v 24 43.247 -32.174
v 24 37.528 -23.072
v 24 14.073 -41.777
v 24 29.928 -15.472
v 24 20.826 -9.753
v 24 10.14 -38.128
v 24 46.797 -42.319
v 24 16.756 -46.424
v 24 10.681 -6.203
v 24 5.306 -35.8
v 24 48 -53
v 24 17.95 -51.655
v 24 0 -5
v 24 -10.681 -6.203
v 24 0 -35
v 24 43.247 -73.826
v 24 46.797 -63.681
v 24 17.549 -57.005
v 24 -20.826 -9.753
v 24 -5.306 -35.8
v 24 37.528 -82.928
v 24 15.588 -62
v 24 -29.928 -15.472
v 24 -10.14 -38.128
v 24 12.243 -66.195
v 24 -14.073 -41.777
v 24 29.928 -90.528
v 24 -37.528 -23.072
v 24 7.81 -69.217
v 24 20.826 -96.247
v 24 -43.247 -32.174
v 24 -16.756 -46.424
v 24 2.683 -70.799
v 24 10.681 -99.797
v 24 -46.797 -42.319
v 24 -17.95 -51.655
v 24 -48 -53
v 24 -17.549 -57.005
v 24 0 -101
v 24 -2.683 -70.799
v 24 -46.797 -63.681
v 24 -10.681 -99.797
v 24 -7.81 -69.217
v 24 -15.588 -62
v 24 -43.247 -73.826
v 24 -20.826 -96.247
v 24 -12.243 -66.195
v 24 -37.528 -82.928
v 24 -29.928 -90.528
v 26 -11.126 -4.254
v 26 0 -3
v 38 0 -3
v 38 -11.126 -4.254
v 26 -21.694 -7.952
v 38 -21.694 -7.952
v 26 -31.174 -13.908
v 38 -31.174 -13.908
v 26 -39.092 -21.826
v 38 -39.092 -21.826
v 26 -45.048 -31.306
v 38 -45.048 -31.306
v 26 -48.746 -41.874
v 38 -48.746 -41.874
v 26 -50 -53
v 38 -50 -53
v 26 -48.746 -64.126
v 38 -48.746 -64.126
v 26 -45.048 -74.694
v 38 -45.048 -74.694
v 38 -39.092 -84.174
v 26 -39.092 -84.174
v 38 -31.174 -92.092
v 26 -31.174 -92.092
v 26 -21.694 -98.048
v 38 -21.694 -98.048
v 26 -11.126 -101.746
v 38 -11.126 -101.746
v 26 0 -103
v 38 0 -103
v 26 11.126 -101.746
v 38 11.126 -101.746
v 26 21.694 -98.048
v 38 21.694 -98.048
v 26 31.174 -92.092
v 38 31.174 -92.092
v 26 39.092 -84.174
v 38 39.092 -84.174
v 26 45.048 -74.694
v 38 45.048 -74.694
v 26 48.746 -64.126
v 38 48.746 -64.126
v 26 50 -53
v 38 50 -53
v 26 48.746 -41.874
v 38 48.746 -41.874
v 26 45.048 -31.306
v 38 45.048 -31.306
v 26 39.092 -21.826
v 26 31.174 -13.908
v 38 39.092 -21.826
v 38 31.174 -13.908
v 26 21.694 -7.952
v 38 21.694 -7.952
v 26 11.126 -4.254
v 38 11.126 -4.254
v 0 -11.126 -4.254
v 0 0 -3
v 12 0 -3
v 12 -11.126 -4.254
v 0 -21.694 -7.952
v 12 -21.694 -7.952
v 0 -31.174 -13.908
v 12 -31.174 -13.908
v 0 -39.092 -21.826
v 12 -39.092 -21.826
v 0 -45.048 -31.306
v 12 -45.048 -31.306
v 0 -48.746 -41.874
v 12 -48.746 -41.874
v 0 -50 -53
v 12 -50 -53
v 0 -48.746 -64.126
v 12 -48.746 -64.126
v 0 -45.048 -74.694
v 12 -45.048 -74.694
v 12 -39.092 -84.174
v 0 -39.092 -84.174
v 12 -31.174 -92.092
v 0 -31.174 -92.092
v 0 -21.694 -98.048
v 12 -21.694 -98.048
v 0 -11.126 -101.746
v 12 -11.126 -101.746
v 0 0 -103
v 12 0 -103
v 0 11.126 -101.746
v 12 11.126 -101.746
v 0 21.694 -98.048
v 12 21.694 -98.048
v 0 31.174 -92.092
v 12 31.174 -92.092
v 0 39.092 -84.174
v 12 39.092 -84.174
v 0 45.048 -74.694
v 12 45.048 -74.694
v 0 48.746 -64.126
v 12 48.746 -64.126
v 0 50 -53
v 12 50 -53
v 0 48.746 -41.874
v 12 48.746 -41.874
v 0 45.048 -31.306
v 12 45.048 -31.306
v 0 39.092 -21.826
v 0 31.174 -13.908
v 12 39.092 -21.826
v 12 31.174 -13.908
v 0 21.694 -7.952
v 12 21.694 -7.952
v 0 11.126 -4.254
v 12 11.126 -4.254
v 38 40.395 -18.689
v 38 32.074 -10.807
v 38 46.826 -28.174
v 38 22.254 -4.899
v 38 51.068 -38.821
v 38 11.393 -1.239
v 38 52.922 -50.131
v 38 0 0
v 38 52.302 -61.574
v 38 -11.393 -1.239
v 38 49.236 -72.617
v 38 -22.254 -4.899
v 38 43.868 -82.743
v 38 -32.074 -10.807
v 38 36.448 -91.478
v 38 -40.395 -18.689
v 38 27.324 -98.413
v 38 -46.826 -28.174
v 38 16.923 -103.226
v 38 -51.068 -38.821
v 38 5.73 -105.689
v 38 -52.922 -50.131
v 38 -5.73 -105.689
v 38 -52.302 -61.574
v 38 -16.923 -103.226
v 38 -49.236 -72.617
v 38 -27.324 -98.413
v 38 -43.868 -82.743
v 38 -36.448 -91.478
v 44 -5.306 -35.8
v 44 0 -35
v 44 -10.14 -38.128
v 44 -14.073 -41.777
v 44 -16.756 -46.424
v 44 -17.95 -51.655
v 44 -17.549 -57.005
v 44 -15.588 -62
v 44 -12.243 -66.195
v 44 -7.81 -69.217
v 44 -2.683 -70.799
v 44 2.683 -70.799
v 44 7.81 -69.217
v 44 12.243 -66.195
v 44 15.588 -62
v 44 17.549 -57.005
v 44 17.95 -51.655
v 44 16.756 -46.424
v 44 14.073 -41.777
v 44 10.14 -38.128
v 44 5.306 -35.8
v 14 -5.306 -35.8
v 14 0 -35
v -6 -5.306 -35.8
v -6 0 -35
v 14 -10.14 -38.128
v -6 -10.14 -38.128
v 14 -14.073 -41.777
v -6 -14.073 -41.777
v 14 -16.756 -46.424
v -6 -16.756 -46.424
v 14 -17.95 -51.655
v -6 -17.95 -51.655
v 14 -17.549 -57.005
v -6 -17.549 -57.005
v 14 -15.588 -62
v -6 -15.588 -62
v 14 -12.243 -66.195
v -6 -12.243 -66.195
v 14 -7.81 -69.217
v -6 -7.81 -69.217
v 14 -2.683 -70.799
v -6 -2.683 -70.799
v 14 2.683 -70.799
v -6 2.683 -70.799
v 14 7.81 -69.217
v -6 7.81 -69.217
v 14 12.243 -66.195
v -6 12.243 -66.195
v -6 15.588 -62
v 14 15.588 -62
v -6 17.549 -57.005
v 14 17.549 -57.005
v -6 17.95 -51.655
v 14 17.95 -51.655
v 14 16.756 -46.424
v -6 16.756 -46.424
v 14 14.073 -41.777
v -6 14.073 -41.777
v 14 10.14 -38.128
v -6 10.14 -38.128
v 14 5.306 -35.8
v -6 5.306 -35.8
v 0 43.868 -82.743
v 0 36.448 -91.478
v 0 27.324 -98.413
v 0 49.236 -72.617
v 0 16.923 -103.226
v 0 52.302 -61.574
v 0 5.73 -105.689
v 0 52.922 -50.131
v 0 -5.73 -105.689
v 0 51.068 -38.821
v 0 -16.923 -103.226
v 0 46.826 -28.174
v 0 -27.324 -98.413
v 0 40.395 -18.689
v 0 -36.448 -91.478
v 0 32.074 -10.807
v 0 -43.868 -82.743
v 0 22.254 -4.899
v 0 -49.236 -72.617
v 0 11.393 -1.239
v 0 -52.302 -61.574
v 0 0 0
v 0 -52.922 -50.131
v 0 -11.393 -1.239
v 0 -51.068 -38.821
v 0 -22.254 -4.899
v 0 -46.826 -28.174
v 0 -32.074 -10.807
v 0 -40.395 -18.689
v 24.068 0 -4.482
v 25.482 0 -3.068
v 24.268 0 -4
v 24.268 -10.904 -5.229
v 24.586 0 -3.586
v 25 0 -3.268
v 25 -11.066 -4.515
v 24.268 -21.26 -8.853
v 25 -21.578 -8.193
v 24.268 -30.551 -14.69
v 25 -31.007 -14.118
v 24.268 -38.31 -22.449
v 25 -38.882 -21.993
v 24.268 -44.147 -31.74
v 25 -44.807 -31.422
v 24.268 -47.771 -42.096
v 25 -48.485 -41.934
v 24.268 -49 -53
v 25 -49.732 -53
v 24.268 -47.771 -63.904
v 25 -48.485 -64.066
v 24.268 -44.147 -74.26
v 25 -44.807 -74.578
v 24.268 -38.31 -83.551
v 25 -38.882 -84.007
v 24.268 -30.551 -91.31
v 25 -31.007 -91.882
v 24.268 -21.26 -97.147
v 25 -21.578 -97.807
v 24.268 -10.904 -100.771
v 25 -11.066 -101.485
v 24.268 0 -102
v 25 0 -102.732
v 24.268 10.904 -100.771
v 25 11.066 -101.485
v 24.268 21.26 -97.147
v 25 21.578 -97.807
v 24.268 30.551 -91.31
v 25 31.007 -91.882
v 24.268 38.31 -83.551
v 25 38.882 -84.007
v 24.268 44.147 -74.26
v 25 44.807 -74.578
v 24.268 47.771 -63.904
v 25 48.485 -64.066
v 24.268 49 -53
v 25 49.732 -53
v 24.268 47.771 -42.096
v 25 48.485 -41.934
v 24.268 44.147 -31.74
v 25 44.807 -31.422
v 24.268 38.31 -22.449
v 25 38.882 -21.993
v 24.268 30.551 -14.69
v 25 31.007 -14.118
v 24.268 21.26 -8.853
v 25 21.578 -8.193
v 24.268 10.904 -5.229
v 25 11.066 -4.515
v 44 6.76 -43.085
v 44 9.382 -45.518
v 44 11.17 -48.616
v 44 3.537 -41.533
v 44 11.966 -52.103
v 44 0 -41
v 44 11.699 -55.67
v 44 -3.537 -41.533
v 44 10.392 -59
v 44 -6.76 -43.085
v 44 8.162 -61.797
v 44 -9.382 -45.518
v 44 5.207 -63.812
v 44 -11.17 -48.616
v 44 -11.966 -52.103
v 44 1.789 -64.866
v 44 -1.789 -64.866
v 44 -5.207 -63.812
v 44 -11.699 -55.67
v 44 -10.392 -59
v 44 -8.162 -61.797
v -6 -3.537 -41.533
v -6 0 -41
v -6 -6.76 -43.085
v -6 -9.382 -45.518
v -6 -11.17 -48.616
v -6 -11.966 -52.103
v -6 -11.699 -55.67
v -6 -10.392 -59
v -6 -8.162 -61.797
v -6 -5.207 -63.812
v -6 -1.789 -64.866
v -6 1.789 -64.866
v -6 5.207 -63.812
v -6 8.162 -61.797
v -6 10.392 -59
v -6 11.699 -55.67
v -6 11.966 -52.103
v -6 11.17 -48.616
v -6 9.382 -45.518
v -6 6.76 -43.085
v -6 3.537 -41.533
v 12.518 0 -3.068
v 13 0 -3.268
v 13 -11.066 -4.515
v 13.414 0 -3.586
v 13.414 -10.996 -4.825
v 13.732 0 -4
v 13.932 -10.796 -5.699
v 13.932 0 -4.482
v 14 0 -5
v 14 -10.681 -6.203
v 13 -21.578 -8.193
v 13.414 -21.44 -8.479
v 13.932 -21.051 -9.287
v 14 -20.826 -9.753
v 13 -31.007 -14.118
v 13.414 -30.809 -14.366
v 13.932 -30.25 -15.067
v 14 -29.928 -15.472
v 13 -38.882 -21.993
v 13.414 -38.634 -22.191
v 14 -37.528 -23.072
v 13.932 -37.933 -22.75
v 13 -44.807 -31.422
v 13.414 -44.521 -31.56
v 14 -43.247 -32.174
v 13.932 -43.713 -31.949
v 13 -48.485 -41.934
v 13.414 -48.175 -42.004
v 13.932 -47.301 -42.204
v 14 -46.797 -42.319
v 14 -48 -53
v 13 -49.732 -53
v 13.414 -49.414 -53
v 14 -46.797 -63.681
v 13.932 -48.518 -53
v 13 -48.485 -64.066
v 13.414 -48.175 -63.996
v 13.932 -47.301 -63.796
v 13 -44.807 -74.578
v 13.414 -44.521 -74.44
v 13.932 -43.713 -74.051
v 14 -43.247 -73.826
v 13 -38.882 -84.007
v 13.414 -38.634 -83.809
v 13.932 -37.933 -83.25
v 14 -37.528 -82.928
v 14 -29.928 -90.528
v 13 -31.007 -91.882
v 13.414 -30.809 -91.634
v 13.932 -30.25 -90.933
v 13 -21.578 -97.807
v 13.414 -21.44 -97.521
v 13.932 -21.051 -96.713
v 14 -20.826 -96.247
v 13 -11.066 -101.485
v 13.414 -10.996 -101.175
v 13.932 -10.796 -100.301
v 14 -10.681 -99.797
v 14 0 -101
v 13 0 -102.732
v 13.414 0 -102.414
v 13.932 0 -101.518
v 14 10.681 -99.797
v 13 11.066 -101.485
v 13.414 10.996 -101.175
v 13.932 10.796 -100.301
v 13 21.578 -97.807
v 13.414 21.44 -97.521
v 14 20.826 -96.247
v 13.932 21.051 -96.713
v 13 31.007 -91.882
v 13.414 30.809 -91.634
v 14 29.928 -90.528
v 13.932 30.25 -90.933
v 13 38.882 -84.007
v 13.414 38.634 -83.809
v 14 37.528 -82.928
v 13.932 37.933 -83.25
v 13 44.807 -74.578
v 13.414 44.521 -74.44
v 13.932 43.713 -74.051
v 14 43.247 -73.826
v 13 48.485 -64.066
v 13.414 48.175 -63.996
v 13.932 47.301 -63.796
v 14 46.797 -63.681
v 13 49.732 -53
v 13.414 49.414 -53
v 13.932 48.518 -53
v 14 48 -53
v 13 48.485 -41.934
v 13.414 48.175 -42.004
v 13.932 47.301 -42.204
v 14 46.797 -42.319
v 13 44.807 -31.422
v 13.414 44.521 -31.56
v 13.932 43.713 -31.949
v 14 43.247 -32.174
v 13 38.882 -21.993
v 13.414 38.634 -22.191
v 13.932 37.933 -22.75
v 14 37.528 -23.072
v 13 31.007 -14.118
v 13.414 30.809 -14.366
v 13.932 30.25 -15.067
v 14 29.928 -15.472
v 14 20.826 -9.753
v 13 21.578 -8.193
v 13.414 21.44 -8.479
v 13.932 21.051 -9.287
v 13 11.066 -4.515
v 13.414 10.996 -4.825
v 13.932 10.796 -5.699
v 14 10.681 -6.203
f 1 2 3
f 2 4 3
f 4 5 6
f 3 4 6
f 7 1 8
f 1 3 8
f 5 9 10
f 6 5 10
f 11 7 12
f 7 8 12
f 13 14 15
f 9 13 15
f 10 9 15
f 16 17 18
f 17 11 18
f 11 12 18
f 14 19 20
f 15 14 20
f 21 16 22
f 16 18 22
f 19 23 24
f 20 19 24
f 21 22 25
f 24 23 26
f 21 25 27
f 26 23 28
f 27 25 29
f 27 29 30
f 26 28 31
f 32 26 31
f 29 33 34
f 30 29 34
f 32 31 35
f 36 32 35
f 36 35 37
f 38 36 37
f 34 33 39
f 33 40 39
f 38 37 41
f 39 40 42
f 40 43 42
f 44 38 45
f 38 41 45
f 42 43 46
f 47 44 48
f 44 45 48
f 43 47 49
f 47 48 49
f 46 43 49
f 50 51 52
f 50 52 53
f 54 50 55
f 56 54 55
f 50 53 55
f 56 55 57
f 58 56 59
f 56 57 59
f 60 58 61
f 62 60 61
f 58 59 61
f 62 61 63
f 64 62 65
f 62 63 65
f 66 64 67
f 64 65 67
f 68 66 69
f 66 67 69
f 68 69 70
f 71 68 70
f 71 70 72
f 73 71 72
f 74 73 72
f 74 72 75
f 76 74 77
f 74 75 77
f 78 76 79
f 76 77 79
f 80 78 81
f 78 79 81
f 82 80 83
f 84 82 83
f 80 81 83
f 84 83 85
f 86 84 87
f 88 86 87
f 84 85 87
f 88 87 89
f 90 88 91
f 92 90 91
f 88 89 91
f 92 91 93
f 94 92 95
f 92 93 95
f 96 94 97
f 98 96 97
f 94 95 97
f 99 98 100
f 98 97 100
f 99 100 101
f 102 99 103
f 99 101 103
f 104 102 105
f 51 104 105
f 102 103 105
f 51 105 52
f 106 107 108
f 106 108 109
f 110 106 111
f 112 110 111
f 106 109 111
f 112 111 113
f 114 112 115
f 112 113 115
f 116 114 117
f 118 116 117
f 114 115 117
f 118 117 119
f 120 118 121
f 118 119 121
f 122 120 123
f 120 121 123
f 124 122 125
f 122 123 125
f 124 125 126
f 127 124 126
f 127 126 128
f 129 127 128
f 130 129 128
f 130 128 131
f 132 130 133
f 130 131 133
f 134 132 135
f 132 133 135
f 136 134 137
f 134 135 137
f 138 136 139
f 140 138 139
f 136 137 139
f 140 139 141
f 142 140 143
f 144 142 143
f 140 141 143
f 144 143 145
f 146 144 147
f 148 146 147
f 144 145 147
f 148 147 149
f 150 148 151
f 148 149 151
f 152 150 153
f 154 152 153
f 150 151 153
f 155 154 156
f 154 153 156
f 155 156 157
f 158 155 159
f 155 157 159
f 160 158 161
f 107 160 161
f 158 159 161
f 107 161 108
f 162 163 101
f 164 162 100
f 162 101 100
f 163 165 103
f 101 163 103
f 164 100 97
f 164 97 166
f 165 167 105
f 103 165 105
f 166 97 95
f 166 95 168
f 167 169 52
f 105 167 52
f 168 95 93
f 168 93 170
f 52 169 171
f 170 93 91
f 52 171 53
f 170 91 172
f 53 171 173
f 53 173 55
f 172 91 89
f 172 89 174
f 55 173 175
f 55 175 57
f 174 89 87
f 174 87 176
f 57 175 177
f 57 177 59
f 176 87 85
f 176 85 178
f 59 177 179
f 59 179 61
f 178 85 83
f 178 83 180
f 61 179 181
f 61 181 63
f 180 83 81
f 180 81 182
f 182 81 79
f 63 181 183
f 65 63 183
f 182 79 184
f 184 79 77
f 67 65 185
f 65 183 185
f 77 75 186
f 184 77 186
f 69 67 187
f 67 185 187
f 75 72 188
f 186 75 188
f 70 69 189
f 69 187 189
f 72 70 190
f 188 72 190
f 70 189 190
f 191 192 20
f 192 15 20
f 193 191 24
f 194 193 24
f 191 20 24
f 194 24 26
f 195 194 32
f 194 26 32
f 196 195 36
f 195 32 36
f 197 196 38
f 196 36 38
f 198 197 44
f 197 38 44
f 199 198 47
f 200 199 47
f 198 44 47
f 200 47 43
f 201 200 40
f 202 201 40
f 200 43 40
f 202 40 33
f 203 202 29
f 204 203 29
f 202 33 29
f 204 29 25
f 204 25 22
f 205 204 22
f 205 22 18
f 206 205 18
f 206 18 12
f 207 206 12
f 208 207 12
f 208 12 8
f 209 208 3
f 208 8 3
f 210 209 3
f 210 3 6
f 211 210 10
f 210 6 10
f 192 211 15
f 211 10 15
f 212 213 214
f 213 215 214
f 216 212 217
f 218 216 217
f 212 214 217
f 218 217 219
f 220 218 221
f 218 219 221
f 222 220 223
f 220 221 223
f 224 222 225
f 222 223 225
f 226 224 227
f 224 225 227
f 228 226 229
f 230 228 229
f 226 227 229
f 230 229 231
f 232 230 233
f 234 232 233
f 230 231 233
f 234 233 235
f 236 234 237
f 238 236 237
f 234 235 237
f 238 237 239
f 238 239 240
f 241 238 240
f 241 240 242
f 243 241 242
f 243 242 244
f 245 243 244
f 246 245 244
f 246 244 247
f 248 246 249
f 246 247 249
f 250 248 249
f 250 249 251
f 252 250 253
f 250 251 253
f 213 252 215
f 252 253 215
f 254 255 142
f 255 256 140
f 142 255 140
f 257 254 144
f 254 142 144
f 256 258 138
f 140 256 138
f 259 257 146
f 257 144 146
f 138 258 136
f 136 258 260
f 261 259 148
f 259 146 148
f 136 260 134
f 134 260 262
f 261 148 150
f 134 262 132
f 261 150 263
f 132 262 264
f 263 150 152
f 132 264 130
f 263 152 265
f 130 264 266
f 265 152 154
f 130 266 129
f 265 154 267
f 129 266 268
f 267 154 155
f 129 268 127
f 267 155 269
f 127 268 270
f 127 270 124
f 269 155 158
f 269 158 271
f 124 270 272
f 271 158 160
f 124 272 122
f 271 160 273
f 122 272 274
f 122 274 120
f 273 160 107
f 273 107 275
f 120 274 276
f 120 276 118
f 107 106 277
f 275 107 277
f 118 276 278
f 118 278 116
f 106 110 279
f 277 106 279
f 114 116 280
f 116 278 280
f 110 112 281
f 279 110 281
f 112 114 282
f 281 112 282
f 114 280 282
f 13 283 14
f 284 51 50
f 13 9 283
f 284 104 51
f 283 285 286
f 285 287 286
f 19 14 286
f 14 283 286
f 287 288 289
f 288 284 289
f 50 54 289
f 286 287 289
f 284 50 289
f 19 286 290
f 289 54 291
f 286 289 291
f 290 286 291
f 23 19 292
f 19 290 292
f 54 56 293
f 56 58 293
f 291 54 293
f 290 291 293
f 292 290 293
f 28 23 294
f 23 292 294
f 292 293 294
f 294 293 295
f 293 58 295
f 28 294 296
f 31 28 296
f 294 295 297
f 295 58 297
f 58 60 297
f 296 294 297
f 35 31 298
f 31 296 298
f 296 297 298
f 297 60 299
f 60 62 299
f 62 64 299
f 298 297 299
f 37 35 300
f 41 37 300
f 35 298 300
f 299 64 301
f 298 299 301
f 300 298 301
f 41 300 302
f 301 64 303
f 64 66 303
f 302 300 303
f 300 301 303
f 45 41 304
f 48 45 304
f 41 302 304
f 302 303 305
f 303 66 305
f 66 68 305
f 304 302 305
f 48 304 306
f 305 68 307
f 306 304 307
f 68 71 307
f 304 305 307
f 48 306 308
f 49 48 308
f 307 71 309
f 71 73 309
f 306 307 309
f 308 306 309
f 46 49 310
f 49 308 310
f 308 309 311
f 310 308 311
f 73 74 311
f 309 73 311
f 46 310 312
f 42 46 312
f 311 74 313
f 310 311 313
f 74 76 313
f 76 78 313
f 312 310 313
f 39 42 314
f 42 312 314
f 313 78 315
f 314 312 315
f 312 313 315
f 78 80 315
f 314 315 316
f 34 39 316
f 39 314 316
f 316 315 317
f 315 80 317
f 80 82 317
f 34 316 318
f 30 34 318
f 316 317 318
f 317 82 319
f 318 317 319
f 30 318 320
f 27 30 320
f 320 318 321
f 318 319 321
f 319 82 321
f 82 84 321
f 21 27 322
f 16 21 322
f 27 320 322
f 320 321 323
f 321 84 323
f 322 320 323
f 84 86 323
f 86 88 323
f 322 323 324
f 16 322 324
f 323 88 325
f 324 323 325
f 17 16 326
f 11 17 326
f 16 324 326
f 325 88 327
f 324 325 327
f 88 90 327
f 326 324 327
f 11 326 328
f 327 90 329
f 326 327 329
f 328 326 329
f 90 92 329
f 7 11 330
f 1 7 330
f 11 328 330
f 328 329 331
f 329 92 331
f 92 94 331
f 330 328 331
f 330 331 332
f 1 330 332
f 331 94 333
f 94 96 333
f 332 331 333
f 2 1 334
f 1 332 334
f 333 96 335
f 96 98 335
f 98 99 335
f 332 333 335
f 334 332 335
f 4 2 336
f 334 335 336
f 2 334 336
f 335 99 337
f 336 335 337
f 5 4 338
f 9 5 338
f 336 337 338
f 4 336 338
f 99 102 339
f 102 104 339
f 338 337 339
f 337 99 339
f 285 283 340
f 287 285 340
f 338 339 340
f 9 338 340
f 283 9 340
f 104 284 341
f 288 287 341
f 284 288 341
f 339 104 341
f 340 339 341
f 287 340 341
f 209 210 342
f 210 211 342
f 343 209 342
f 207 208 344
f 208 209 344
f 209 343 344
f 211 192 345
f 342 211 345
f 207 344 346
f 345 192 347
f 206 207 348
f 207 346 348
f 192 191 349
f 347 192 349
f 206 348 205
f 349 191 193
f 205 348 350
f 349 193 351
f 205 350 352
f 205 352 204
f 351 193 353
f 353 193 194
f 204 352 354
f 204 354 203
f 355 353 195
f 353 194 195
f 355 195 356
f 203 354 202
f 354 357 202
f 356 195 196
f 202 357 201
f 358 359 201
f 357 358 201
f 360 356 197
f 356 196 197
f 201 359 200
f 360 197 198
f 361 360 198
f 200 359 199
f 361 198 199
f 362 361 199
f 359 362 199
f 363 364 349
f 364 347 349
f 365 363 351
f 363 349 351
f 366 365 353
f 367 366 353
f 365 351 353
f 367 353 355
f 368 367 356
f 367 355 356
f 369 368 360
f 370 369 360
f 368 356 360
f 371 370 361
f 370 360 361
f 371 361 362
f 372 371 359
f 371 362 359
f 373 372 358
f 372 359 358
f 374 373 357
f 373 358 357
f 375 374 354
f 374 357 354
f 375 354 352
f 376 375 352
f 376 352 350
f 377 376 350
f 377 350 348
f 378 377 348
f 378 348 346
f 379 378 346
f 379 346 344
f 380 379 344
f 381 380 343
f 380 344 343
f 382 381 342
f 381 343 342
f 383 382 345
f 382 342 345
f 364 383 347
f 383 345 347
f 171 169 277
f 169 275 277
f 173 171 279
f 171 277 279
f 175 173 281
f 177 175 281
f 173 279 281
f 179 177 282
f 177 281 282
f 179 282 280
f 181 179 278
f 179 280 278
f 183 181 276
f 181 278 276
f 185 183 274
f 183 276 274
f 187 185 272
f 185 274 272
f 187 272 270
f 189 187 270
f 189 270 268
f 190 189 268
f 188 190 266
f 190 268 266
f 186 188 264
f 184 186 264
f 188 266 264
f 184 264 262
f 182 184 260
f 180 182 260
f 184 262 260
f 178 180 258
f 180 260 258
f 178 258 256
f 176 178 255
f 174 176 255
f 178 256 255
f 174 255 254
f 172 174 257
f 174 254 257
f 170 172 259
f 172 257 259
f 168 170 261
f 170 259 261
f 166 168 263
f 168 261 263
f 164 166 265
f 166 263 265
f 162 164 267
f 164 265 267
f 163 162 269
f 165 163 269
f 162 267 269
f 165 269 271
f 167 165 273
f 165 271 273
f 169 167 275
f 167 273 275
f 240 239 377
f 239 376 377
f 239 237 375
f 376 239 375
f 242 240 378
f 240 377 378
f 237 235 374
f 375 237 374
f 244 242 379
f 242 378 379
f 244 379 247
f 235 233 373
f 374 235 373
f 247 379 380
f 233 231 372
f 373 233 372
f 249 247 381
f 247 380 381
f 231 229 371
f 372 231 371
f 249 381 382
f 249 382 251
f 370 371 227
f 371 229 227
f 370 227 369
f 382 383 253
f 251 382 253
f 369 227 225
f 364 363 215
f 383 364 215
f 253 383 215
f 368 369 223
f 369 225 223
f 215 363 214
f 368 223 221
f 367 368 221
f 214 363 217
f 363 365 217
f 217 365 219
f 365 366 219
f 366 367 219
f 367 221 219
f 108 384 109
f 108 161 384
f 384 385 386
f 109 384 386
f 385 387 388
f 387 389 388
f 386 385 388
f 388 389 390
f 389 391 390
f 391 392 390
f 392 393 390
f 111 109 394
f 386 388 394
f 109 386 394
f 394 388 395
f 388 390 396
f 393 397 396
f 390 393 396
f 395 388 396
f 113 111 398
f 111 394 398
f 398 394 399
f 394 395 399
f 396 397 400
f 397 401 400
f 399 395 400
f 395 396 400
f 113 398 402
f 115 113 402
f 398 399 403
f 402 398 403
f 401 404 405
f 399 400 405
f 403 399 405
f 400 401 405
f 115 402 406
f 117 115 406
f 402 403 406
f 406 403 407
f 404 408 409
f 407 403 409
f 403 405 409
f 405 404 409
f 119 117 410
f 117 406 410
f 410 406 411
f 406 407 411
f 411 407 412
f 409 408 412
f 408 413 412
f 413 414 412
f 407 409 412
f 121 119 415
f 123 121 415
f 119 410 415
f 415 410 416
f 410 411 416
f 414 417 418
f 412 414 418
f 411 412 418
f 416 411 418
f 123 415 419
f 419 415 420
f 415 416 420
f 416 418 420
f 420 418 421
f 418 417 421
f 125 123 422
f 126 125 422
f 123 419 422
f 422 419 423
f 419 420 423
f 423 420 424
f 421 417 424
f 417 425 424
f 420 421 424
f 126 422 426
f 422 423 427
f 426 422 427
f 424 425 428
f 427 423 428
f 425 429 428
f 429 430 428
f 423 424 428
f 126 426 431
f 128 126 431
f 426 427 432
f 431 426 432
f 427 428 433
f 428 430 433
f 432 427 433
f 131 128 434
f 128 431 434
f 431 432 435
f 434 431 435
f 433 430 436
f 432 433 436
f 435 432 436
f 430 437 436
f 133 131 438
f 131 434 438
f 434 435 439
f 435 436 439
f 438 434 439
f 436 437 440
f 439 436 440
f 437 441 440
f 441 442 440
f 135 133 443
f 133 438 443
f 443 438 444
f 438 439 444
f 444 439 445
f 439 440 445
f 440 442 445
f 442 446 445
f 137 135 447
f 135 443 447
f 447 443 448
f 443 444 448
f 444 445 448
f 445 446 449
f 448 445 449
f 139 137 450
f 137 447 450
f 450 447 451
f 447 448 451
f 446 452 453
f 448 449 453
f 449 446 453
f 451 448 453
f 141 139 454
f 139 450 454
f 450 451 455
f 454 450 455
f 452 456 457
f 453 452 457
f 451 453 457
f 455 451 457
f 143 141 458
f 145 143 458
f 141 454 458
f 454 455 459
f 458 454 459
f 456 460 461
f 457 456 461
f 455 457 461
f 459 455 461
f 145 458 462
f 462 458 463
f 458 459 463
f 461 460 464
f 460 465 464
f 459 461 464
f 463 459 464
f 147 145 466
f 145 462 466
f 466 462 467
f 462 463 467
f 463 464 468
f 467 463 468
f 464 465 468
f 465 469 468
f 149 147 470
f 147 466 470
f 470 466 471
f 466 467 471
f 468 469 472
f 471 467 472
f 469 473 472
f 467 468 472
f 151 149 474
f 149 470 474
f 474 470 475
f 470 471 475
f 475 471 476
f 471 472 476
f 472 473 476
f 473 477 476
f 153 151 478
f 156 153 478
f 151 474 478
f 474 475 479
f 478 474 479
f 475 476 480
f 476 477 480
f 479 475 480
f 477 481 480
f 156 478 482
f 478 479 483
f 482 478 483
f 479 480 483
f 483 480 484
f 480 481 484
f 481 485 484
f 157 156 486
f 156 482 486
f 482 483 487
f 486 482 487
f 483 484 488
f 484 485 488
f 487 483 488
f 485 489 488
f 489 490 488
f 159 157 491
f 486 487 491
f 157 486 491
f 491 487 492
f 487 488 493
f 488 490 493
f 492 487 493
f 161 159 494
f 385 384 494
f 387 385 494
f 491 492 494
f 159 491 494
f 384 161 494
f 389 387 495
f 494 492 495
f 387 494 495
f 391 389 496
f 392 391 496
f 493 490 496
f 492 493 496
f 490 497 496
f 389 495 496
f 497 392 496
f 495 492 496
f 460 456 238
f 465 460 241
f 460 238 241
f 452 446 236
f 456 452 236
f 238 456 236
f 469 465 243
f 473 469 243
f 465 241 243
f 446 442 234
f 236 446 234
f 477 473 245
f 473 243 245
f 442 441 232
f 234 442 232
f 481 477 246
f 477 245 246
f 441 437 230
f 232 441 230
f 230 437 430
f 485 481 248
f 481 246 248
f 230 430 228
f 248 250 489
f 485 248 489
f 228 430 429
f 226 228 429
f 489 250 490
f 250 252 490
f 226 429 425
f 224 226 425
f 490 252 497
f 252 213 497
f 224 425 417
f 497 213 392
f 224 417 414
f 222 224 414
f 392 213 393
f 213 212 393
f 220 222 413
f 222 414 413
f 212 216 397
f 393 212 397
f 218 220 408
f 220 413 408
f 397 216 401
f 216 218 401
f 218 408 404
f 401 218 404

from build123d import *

# Parameters (mm, degrees)
F2_R = 2


with BuildPart() as f1:
    # F0 (on Front) → F1 (revolve)
    with BuildSketch(Plane.XZ):
        Polygon((38, 0), (0, 0), (0, -3), (12.181578204, -3), (14, -3), (14, -35), (-6, -35), (-6, -41), (44, -41), (44, -35), (24, -35), (24, -3), (38, -3), align=None)
    revolve(axis=Axis((16.9901512563, 0, -53), (1, 0, 0)))

    # F2
    f2_edges = [f1.edges().sort_by_distance(p)[0] for p in [
        (14, 0, -103),
        (24, 0, -103),
    ]]
    fillet(f2_edges, radius=F2_R)


solid = f1.part
